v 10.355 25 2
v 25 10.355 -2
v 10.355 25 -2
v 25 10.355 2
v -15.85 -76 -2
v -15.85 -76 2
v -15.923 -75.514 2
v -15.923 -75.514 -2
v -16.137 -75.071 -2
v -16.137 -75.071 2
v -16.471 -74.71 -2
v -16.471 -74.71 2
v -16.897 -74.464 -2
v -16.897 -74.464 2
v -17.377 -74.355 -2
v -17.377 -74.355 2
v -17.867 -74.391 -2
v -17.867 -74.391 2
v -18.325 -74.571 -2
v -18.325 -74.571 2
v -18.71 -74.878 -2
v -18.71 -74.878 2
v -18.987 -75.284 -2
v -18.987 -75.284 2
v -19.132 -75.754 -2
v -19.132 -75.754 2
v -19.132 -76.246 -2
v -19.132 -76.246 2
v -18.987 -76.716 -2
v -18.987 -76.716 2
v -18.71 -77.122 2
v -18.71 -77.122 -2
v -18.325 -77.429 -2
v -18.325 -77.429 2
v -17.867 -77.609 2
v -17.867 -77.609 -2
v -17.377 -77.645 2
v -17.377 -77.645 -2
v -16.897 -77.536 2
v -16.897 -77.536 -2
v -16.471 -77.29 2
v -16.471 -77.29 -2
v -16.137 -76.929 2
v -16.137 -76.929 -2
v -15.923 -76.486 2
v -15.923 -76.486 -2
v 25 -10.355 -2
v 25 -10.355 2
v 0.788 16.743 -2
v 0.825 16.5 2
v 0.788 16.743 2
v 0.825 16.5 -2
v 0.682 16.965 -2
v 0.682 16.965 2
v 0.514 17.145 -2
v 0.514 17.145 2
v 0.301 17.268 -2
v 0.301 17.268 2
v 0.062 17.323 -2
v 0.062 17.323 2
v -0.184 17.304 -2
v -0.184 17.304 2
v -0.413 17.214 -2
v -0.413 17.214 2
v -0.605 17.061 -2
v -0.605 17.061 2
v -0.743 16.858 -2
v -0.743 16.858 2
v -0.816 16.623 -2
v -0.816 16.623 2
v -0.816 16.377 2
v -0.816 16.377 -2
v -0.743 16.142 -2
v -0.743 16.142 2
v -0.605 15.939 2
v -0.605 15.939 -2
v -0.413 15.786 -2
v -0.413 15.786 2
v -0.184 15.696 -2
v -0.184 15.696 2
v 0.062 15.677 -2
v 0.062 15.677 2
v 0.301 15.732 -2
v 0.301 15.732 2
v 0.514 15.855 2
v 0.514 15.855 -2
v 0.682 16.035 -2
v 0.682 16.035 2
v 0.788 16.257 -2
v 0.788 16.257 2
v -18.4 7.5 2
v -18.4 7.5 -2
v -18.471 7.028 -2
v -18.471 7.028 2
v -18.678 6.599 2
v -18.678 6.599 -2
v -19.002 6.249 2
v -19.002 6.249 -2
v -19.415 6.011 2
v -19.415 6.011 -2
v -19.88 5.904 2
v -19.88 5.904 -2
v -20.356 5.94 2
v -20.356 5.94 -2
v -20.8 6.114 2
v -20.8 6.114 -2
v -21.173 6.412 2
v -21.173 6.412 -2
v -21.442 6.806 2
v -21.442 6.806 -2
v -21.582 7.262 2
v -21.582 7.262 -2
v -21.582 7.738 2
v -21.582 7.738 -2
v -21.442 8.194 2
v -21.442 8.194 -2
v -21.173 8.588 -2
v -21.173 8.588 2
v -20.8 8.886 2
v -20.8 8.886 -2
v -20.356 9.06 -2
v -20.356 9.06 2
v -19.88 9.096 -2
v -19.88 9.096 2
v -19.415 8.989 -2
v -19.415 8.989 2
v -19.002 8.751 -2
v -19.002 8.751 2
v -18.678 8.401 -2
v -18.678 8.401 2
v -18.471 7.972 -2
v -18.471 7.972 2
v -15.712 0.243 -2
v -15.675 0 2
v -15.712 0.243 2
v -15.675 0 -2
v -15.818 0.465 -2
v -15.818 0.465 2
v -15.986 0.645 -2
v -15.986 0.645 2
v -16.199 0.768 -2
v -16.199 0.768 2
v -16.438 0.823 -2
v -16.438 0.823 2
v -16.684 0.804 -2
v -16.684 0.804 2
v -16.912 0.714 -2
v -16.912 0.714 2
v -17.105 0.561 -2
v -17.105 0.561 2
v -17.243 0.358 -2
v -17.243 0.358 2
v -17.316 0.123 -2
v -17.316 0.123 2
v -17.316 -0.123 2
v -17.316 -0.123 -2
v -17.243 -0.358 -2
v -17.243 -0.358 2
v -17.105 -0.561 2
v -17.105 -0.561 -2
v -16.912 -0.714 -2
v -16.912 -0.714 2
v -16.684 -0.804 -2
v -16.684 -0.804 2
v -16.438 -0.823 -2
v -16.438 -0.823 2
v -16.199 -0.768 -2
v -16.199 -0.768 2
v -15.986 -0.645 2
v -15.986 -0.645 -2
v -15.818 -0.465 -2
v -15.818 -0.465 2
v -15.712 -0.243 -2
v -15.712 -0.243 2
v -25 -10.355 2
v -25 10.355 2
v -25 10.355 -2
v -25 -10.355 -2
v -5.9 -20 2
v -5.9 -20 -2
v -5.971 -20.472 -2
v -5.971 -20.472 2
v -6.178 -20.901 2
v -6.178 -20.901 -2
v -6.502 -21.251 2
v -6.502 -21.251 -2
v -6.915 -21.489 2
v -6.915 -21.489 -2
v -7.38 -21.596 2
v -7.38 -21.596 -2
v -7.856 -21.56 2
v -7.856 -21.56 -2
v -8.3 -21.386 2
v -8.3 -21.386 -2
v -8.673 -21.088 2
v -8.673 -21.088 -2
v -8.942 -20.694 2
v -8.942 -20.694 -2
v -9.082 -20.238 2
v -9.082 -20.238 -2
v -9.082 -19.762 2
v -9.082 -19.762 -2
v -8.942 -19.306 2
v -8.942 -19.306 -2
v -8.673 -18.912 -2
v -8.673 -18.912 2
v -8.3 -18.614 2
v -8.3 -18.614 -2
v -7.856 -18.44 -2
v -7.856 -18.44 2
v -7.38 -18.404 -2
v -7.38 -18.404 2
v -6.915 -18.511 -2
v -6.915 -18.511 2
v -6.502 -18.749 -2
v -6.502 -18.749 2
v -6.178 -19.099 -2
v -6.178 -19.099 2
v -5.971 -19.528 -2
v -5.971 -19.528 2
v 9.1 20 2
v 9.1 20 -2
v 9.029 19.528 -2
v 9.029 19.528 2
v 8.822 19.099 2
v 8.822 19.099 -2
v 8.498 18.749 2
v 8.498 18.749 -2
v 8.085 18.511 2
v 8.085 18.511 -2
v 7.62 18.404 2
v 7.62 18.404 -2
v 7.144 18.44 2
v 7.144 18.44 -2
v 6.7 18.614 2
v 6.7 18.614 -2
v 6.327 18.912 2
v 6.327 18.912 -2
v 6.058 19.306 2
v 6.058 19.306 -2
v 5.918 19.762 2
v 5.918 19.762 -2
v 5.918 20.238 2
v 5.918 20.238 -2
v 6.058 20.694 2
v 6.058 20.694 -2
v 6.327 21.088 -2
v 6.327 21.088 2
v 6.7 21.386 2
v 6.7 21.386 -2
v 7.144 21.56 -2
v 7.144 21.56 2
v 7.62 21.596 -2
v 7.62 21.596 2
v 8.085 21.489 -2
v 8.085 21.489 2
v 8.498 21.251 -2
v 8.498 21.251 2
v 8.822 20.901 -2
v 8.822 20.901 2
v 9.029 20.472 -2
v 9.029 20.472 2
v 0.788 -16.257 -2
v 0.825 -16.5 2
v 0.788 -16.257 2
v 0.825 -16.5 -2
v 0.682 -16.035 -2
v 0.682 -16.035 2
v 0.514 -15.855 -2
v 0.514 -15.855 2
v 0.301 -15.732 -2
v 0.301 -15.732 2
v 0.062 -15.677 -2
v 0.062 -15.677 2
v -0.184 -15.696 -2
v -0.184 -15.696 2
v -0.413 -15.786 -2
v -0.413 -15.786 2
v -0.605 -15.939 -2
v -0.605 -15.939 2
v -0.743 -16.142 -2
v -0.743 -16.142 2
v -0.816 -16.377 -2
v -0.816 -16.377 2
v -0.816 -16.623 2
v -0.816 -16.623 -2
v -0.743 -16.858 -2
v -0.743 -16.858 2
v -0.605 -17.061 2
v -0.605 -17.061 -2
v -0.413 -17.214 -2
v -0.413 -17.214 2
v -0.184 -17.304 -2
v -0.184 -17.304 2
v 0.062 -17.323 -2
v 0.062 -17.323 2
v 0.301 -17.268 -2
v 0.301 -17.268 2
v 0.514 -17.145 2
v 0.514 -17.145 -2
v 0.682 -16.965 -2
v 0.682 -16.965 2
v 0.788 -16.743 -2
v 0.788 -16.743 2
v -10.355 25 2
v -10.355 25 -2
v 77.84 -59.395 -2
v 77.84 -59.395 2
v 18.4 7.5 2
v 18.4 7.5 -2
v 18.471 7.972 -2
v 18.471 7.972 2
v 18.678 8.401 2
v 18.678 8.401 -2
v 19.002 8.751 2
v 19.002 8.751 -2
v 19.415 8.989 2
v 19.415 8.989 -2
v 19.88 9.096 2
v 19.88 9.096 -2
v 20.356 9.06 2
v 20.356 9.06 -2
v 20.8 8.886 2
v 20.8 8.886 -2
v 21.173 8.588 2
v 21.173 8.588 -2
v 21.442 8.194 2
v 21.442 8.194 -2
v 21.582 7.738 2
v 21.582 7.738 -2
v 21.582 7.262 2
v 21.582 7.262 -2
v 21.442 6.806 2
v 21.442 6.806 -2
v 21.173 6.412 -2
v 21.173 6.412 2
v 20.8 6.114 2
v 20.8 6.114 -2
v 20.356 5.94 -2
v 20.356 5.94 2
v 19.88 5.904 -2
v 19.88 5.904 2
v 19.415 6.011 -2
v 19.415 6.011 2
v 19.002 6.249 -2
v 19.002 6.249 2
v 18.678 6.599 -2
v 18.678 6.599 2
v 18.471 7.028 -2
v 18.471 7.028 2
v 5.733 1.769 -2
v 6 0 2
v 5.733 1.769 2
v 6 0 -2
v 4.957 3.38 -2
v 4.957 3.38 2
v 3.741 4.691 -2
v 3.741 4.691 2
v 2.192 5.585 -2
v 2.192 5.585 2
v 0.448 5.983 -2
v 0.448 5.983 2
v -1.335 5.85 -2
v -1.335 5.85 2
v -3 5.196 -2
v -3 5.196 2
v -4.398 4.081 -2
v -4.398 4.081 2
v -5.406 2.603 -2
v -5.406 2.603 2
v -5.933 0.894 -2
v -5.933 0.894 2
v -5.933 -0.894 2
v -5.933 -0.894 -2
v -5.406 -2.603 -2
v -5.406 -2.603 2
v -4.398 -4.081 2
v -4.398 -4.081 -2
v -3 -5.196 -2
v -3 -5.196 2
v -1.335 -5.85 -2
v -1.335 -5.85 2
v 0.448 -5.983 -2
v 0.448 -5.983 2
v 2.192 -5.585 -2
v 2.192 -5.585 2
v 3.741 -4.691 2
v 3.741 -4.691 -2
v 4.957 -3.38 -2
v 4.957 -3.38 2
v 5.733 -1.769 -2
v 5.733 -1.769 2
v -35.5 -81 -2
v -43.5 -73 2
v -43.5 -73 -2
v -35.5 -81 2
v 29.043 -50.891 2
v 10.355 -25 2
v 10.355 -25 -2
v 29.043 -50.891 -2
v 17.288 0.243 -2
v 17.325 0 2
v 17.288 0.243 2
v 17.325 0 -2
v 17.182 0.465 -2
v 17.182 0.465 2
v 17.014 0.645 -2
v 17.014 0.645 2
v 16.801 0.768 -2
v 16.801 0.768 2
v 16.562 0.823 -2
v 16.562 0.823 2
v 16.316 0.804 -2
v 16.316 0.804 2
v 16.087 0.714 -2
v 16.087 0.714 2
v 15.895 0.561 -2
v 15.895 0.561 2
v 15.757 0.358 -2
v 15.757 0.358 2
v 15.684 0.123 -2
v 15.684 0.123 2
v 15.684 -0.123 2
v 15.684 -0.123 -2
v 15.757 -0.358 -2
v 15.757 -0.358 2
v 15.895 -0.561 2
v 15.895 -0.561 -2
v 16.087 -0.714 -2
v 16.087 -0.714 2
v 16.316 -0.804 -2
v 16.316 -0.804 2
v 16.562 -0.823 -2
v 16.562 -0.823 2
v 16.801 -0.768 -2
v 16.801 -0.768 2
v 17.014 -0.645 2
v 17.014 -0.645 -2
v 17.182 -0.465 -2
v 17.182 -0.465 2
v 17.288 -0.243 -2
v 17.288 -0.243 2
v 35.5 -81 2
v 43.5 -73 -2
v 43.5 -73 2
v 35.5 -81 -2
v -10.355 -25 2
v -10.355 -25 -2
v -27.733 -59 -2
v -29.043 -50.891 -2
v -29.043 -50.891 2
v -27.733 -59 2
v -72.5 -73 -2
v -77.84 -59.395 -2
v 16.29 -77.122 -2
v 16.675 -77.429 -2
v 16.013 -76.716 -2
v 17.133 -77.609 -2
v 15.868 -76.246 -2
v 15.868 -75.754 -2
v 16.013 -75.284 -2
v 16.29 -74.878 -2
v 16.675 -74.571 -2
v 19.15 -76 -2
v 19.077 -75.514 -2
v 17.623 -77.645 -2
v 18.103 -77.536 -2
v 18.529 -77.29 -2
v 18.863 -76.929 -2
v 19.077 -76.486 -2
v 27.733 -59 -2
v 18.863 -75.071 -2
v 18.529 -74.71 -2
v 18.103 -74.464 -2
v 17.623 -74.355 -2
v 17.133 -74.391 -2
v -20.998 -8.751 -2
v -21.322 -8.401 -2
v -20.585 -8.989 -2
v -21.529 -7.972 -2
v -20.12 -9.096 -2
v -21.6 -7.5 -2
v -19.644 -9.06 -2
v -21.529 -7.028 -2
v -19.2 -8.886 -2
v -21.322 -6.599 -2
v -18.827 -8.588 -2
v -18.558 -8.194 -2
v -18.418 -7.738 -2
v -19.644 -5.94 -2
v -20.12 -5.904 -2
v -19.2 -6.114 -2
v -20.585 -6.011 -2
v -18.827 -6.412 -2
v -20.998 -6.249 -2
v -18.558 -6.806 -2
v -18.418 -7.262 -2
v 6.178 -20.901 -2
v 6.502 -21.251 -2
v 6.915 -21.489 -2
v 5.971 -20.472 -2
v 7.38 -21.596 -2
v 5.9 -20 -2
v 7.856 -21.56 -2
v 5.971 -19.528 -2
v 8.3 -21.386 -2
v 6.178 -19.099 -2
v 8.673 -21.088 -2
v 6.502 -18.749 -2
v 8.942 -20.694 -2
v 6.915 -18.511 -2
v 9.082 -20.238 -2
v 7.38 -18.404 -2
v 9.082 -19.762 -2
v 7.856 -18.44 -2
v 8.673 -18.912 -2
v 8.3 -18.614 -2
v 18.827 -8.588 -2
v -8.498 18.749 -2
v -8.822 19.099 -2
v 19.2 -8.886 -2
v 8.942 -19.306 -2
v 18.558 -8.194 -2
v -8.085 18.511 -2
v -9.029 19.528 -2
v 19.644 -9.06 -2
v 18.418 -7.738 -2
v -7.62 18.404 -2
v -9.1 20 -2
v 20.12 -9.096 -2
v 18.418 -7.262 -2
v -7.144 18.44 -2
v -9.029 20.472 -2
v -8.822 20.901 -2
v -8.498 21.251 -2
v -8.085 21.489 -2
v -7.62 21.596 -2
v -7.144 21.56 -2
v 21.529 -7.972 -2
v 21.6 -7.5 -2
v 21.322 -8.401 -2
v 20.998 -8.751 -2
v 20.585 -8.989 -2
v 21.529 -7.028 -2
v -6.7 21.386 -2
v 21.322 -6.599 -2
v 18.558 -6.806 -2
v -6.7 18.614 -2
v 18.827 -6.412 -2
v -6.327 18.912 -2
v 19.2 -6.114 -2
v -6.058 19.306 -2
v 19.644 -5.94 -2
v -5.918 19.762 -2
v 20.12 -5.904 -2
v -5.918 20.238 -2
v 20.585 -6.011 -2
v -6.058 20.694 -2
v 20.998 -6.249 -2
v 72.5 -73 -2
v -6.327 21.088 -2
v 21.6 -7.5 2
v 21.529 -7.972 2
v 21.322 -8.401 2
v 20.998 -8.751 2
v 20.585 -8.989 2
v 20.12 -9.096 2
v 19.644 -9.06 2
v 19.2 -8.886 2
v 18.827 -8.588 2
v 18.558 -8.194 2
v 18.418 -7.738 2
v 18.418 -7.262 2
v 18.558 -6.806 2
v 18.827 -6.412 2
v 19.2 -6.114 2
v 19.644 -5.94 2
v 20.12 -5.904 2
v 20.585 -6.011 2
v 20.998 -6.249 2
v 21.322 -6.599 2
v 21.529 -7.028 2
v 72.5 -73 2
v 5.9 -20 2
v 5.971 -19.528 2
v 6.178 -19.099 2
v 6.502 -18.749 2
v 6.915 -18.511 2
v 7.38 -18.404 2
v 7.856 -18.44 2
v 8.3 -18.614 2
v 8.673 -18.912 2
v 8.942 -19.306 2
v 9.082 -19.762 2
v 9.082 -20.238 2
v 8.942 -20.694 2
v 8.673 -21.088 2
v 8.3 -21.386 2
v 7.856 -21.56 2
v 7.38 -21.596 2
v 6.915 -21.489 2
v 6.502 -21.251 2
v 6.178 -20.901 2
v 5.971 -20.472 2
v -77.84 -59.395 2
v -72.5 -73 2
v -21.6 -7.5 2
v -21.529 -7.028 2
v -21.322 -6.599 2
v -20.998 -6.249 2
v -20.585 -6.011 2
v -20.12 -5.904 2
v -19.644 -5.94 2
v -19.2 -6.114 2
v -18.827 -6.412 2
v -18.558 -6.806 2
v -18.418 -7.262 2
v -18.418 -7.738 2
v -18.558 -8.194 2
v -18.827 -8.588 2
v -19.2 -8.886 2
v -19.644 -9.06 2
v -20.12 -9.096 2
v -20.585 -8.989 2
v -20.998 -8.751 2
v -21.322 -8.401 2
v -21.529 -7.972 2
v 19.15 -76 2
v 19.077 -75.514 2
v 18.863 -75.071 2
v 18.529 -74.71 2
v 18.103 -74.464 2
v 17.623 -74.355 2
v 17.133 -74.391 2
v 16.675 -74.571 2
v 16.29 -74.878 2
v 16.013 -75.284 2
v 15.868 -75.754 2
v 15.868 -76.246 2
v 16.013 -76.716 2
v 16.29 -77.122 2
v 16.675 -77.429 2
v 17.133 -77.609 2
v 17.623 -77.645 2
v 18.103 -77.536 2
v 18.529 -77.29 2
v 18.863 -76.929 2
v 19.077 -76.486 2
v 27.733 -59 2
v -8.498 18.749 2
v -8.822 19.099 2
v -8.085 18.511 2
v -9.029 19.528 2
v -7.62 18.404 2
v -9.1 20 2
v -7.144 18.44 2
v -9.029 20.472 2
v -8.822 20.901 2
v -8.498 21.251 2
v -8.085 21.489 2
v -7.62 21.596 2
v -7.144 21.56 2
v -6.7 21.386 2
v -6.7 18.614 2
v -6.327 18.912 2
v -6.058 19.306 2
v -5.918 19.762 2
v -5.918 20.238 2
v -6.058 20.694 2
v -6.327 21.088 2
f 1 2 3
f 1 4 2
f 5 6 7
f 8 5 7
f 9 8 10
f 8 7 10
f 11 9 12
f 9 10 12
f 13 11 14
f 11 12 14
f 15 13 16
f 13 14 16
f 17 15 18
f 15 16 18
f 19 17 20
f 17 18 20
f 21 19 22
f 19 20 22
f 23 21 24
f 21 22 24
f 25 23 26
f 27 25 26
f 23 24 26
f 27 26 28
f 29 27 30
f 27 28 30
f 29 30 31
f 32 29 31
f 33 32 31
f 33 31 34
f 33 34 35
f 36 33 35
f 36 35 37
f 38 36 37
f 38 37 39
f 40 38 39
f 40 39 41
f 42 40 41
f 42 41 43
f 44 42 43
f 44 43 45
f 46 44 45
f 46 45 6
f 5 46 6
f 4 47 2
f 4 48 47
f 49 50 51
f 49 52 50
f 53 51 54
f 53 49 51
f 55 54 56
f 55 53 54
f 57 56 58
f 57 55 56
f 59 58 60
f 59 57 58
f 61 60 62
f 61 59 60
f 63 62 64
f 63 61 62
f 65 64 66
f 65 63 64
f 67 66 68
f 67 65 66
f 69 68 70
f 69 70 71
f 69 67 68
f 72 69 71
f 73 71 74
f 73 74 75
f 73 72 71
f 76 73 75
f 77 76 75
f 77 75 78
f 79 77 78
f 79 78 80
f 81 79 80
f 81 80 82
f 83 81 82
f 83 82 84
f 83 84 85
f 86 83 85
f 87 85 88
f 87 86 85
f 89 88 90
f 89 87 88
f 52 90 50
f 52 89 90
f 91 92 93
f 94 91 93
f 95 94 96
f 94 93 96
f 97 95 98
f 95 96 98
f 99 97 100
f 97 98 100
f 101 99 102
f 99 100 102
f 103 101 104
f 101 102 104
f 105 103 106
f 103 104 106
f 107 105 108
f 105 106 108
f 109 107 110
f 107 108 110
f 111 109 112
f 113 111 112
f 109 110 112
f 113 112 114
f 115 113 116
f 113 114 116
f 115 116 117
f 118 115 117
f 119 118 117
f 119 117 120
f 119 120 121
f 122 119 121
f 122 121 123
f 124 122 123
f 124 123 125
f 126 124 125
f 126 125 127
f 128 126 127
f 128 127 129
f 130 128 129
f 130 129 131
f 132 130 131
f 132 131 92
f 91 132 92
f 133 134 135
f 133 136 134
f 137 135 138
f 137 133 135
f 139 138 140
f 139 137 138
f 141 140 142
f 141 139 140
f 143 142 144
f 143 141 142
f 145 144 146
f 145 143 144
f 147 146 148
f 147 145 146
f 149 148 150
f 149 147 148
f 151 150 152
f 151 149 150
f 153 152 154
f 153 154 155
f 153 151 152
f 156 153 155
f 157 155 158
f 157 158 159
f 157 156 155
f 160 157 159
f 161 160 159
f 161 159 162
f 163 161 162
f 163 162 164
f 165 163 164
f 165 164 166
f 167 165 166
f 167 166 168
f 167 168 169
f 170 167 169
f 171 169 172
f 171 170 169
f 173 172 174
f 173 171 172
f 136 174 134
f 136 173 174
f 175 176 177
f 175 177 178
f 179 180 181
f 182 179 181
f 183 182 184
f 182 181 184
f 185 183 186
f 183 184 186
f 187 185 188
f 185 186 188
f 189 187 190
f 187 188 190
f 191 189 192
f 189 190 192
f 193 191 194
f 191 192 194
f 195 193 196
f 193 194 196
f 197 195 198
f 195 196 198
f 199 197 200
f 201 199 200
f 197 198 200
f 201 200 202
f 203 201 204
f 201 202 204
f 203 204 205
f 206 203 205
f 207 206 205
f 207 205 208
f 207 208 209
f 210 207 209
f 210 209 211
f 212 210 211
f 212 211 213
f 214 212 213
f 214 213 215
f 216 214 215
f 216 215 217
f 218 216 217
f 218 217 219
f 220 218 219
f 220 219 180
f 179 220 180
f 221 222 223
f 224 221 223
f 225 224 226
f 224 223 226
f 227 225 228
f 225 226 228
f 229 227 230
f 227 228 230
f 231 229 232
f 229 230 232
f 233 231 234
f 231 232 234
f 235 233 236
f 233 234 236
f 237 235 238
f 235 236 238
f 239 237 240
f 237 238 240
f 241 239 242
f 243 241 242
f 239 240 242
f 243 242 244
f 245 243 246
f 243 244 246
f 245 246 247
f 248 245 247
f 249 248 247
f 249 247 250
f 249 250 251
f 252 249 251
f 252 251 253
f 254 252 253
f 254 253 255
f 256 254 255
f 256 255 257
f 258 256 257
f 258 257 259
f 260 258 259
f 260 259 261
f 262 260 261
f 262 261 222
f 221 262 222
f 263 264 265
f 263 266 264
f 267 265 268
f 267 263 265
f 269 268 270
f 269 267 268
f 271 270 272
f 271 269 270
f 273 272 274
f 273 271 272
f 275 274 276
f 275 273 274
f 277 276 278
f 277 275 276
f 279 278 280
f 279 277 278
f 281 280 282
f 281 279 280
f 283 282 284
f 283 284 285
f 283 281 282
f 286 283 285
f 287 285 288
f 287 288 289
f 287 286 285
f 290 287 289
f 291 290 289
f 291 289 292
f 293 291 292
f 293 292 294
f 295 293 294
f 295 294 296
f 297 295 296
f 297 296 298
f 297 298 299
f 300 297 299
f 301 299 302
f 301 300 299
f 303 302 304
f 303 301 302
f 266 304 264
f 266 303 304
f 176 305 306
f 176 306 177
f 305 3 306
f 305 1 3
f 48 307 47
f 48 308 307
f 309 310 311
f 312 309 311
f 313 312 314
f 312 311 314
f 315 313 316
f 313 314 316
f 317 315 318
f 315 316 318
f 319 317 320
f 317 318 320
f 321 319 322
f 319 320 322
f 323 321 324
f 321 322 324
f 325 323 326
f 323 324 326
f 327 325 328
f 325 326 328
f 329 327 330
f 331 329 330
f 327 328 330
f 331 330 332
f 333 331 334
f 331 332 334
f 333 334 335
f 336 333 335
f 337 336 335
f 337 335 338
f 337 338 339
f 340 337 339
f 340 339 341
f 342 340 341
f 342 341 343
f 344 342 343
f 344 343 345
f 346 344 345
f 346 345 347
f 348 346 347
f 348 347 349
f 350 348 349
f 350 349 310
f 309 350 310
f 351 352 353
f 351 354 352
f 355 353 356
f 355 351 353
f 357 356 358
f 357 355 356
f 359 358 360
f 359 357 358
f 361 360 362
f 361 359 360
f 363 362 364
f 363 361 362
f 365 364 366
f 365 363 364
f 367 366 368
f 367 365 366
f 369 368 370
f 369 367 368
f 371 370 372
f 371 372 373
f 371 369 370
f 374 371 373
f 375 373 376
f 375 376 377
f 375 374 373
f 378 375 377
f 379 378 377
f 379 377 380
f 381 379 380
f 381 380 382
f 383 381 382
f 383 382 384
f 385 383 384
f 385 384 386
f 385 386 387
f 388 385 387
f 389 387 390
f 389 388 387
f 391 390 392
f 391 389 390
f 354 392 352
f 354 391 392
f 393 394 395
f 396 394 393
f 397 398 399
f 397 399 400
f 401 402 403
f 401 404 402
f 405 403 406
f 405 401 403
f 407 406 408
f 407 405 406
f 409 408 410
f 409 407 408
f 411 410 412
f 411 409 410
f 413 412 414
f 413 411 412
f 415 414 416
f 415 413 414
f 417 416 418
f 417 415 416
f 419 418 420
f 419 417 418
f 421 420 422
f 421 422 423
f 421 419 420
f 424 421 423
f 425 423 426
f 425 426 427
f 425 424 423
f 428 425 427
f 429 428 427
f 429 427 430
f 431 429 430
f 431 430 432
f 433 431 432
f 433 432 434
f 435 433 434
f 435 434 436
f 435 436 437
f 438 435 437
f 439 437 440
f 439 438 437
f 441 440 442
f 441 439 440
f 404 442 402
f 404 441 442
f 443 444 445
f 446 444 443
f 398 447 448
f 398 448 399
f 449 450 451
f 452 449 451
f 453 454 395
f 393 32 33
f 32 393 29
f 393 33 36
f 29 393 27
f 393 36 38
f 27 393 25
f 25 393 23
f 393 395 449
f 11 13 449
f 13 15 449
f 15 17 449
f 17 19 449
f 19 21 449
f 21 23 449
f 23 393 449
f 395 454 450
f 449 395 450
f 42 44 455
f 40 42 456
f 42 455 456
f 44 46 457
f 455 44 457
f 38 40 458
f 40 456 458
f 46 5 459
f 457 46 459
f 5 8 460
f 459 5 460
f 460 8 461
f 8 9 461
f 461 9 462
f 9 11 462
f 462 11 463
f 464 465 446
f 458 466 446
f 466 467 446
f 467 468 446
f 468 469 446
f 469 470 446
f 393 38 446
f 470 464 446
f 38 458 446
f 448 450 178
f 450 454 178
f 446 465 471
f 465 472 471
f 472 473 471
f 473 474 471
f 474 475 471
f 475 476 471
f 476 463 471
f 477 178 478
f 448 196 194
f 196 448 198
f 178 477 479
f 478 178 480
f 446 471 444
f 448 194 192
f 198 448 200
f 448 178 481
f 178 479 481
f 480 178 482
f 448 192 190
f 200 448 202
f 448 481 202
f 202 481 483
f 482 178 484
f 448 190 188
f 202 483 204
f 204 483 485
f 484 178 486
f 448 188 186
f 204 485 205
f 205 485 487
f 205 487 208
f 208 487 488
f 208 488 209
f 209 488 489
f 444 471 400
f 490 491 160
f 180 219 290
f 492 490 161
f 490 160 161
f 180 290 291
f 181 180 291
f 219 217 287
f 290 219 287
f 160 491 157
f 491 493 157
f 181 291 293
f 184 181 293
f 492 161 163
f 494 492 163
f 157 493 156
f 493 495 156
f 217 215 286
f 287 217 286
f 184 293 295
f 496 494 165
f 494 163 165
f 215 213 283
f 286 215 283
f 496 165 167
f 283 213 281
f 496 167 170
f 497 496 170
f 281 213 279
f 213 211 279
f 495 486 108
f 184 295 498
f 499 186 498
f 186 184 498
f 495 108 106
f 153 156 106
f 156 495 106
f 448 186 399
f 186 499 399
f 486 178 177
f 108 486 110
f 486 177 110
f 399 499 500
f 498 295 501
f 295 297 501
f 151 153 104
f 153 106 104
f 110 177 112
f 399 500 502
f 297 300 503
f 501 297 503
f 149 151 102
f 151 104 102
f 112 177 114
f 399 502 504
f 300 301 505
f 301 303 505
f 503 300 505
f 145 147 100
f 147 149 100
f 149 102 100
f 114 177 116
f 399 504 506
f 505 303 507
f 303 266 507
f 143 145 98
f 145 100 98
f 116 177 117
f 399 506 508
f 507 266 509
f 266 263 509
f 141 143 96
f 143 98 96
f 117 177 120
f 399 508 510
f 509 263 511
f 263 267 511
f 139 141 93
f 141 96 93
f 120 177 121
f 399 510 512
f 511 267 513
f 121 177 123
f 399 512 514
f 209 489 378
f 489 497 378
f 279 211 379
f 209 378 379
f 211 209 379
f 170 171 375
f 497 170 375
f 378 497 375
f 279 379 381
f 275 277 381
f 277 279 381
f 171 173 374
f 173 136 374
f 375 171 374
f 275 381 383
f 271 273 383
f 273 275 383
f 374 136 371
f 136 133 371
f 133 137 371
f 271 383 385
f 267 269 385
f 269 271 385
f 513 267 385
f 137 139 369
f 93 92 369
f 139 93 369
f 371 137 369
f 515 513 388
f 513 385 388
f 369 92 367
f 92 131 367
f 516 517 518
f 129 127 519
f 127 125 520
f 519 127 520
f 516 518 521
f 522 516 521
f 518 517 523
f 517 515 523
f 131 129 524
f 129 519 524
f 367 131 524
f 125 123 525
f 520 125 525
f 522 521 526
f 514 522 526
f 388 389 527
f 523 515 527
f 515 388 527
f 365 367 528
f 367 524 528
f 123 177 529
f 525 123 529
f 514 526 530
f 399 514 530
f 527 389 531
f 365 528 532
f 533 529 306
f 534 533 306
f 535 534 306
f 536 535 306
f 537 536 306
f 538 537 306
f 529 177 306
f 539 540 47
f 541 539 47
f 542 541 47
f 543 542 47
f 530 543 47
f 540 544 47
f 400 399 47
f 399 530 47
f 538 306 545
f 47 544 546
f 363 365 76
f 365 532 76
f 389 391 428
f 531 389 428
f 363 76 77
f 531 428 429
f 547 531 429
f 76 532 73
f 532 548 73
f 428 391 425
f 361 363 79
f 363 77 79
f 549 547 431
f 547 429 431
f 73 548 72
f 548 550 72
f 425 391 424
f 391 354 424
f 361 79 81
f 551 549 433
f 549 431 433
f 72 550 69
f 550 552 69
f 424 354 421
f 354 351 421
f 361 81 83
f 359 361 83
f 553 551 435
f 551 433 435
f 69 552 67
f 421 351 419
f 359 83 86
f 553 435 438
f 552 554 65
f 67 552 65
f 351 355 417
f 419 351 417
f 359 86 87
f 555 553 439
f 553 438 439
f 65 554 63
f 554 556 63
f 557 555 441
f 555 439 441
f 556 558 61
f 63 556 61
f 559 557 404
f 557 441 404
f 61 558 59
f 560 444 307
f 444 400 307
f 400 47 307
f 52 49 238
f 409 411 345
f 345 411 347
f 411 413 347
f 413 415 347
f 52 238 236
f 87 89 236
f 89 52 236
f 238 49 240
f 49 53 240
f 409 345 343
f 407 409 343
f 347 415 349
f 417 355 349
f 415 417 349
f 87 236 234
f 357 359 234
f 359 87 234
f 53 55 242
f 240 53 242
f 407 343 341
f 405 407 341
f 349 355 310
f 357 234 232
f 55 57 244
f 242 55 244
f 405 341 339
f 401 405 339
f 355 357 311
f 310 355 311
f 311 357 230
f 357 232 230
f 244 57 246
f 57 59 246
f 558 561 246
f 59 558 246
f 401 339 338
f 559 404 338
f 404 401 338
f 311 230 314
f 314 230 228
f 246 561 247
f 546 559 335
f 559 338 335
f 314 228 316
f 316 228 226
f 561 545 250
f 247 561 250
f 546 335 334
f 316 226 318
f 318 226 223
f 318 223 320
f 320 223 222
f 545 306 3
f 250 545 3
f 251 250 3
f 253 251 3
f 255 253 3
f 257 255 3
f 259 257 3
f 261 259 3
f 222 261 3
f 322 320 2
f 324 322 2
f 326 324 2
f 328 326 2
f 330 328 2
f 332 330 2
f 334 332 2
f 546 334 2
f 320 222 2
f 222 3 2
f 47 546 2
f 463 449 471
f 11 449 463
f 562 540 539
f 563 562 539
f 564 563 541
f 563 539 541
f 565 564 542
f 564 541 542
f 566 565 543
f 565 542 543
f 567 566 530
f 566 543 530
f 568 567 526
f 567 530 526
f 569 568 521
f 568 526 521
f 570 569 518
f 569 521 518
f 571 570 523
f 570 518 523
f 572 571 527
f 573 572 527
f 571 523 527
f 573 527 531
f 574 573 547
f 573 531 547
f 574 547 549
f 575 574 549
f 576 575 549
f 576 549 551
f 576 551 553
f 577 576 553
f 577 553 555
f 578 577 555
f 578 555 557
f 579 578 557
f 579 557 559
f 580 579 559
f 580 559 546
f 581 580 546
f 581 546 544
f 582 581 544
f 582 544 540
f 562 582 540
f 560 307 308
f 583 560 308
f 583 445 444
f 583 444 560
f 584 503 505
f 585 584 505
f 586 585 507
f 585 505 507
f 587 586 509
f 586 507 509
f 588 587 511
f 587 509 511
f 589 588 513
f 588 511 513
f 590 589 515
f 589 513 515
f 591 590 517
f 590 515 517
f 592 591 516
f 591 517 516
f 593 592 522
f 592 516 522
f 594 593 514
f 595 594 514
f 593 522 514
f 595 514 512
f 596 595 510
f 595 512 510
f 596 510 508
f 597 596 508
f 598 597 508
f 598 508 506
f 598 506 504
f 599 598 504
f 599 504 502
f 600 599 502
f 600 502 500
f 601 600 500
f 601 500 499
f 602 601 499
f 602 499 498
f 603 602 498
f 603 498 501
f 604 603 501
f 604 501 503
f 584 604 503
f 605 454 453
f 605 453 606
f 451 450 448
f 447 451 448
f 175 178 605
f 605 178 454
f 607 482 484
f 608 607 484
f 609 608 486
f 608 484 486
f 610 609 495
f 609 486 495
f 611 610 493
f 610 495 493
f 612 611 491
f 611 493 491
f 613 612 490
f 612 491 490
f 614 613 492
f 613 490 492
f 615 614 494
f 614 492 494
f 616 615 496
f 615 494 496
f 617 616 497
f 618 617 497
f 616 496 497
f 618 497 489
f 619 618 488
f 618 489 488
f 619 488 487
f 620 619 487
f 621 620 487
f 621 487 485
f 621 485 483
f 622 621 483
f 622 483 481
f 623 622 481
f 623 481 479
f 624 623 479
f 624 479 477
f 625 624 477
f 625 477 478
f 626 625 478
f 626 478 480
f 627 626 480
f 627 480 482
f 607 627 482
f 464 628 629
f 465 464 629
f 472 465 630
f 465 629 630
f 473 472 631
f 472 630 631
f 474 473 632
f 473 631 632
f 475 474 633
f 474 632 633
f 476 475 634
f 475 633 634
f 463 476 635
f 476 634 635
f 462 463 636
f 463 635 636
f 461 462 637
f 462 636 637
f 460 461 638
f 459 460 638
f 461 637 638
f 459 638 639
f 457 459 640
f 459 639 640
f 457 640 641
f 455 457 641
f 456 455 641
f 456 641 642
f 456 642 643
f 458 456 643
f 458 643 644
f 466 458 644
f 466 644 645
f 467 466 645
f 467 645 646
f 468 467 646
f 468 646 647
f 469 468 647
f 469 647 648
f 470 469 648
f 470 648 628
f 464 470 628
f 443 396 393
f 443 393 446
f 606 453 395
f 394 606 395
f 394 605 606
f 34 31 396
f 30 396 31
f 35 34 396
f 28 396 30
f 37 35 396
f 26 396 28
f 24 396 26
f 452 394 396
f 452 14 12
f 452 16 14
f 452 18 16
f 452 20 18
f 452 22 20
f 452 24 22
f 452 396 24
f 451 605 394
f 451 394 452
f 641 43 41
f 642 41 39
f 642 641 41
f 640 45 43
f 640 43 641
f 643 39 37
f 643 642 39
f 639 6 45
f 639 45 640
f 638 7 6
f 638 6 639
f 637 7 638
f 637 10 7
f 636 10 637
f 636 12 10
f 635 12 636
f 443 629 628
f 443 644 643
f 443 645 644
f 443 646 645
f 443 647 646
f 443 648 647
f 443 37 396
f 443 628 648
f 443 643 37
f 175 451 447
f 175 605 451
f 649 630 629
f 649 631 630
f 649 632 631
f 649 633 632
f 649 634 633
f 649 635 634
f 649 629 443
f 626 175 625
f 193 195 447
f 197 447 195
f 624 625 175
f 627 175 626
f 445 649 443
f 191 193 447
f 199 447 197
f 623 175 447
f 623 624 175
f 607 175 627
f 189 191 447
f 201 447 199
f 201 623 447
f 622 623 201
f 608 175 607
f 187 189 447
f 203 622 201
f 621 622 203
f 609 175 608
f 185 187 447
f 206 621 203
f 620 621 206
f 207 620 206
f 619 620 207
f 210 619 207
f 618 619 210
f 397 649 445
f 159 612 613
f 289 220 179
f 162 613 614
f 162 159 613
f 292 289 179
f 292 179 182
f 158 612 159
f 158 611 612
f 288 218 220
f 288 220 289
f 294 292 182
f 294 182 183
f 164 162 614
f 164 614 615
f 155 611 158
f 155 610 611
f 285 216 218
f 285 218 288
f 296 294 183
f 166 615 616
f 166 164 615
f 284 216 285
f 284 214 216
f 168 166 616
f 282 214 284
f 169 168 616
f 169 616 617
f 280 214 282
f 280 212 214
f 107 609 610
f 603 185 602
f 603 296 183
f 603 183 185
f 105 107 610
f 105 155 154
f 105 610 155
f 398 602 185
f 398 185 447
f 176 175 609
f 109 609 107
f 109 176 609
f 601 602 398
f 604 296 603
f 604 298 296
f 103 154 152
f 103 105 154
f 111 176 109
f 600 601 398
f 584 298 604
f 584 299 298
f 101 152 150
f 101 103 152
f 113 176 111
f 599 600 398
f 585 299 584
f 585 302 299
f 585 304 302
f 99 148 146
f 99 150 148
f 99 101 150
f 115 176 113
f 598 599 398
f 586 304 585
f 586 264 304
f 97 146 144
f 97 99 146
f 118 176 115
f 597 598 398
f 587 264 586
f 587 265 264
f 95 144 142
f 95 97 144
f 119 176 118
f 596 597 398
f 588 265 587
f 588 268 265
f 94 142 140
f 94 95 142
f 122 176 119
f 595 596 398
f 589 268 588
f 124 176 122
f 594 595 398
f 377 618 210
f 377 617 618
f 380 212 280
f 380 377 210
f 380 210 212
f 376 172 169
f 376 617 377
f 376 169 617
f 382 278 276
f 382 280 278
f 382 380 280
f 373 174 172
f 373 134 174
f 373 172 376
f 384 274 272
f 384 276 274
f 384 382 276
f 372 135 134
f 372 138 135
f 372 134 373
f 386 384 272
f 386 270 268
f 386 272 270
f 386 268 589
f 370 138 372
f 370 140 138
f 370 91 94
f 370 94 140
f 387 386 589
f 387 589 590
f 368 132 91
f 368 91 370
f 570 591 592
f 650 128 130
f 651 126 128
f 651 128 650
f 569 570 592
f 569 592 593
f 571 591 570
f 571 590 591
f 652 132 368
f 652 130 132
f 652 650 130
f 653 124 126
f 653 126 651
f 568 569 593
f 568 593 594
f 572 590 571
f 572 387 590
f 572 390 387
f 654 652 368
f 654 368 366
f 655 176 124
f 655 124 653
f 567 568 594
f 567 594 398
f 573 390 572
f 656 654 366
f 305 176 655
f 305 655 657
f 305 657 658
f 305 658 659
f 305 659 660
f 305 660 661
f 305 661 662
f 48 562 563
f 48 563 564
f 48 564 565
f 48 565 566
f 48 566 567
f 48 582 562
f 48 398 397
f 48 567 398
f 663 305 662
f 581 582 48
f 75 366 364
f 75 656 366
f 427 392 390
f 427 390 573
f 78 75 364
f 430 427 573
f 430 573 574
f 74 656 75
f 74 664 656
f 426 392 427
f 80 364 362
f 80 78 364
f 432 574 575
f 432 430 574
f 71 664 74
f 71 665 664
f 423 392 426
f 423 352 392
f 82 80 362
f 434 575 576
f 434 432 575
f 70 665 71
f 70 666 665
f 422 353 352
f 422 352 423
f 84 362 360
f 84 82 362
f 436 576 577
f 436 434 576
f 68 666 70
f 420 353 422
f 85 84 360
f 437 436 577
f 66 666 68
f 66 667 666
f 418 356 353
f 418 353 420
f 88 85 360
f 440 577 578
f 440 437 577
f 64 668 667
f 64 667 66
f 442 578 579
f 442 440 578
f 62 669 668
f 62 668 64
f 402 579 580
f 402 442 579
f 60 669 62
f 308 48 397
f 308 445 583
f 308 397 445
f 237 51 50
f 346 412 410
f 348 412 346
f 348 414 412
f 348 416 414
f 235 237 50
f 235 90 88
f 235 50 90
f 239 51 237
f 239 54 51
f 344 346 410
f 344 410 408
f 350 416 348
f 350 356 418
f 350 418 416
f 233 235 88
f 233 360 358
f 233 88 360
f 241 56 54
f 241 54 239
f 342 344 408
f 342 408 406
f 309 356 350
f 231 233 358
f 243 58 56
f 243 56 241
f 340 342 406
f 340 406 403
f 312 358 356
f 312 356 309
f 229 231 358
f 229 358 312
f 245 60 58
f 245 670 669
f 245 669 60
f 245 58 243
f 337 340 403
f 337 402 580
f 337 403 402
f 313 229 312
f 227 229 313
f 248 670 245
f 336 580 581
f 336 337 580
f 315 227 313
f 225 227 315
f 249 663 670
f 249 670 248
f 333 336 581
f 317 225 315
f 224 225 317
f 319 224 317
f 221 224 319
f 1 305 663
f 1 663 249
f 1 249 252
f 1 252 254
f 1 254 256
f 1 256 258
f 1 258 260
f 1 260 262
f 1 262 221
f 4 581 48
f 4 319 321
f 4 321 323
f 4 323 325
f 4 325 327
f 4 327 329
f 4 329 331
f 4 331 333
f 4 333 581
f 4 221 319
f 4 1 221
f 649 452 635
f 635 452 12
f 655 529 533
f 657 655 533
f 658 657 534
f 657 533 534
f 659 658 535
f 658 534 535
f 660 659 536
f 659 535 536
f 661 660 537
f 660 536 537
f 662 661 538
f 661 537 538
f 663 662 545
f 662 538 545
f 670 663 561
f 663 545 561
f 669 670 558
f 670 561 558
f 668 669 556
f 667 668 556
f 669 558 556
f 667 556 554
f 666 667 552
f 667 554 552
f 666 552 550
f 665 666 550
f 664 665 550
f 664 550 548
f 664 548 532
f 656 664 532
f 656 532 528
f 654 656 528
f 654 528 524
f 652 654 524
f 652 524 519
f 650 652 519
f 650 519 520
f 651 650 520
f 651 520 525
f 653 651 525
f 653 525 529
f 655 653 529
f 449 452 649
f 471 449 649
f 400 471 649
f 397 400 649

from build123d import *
from OCP.BRepFilletAPI import BRepFilletAPI_MakeChamfer

# Parameters (mm, degrees)
SKETCH_2_R          = 0.825
SKETCH_2_R_2        = 6
EXTRUDE_1_DEPTH     = 2
SKETCH_4_R          = 1.6
CUT_EXTRUDE_1_DEPTH = 15
EXTRUDE_2_DEPTH     = 2
EXTRUDE_3_DEPTH     = 2
CHAMFER_2_SIZE      = 20
SKETCH_8_W          = 95
SKETCH_8_H          = 22
EXTRUDE_4_DEPTH     = 2
CHAMFER_3_SIZE      = 12
CHAMFER_4_SIZE      = 10
CHAMFER_4_SIZE2     = 7.162801166
SKETCH_10_R         = 1.65
CUT_EXTRUDE_2_DEPTH = 14


with BuildPart() as part:
    # 草图2 → 凸台-拉伸1 (new, symmetric)
    with BuildSketch(Plane.XY):
        Polygon((10.355339059, 25), (-10.355339059, 25), (-25, 10.355339059), (-25, -10.355339059), (-10.355339059, -25), (10.355339059, -25), (25, -10.355339059), (25, 10.355339059), align=None)
        with Locations((-16.5, 0)):
            Circle(SKETCH_2_R, mode=Mode.SUBTRACT)
        with Locations((0, 16.5)):
            Circle(SKETCH_2_R, mode=Mode.SUBTRACT)
        with Locations((16.5, 0)):
            Circle(SKETCH_2_R, mode=Mode.SUBTRACT)
        with Locations((0, -16.5)):
            Circle(SKETCH_2_R, mode=Mode.SUBTRACT)
        Circle(SKETCH_2_R_2, mode=Mode.SUBTRACT)
    extrude(amount=EXTRUDE_1_DEPTH, both=True)

    # 草图4 → 切除-拉伸1 (cut)
    with BuildSketch(Plane(origin=(0, 0, -2), x_dir=(-1, 0, 0), z_dir=(0, 0, -1))):
        with Locations((-7.5, -20)):
            Circle(SKETCH_4_R)
        with Locations(Location((7.5, -20, 0), (0, 0, 180))):
            Circle(SKETCH_4_R)
        with Locations((-20, 7.5)):
            Circle(SKETCH_4_R)
        with Locations(Location((-20, -7.5, 0), (0, 0, 180))):
            Circle(SKETCH_4_R)
        with Locations((7.5, 20)):
            Circle(SKETCH_4_R)
        with Locations(Location((-7.5, 20, 0), (0, 0, 180))):
            Circle(SKETCH_4_R)
        with Locations((20, -7.5)):
            Circle(SKETCH_4_R)
        with Locations(Location((20, 7.5, 0), (0, 0, 180))):
            Circle(SKETCH_4_R)
    extrude(amount=-CUT_EXTRUDE_1_DEPTH, mode=Mode.SUBTRACT)

    # 草图5 → 凸台-拉伸2 (add, symmetric)
    with BuildSketch(Plane.XY):
        Polygon((-25, -10.355339059), (-92.5, -73), (-70, -73), (-16.17766953, -19.17766953), align=None)
        Polygon((70, -73), (92.5, -73), (25, -10.355339059), (16.17766953, -19.17766953), align=None)
    extrude(amount=EXTRUDE_2_DEPTH, both=True)

    # 草图6 → 凸台-拉伸3 (add, symmetric)
    with BuildSketch(Plane.XY):
        Polygon((-70, -73), (-45, -73), (-10.355339059, -25), (-16.17766953, -19.17766953), align=None)
        Polygon((70, -73), (16.17766953, -19.17766953), (10.355339059, -25), (45, -73), align=None)
    extrude(amount=EXTRUDE_3_DEPTH, both=True)

    # 倒角2
    chamfer_2_edges = [part.edges().sort_by_distance(p)[0] for p in [
        (-92.5, -73, 0),
        (92.5, -73, 0),
    ]]
    chamfer(chamfer_2_edges, length=CHAMFER_2_SIZE)

    # 草图8 → 凸台-拉伸4 (add, symmetric)
    with BuildSketch(Plane.XY):
        with Locations((0, -70)):
            Rectangle(SKETCH_8_W, SKETCH_8_H)
    extrude(amount=EXTRUDE_4_DEPTH, both=True)

    # 倒角3
    # the kernel refuses this chamfer: 12 mm, written as the material it takes off along each edge
    with BuildSketch(Plane(origin=(47.5, -81, -32.860195856), x_dir=(0.02749587661058619, 0.9996219169112968, 0), z_dir=(0, 0, 1))) as chamfer_3_piece_1_section:
        Polygon((CHAMFER_3_SIZE * 0.999621916911, CHAMFER_3_SIZE * 0.0274958766106), (-CHAMFER_3_SIZE * 0.0274958766106, CHAMFER_3_SIZE * 0.999621916911), (0, 0), align=None)
    chamfer_3_piece_1 = extrude(amount=65.720391711, mode=Mode.PRIVATE)
    chamfer_3_piece_1 = split(chamfer_3_piece_1, bisect_by=Plane(origin=(43.13163598, -73, 0), z_dir=(0, -1, 0)), keep=Keep.TOP, mode=Mode.PRIVATE)
    add(chamfer_3_piece_1, mode=Mode.SUBTRACT)
    with BuildSketch(Plane(origin=(-47.5, -81, 32.860195856), x_dir=(-0.02749587661058619, 0.9996219169112968, 0), z_dir=(0, 0, -1))) as chamfer_3_piece_2_section:
        Polygon((CHAMFER_3_SIZE * 0.999621916911, CHAMFER_3_SIZE * 0.0274958766106), (-CHAMFER_3_SIZE * 0.0274958766106, CHAMFER_3_SIZE * 0.999621916911), (0, 0), align=None)
    chamfer_3_piece_2 = extrude(amount=65.720391711, mode=Mode.PRIVATE)
    chamfer_3_piece_2 = split(chamfer_3_piece_2, bisect_by=Plane(origin=(-43.13163598, -73, 0), z_dir=(0, -1, 0)), keep=Keep.TOP, mode=Mode.PRIVATE)
    add(chamfer_3_piece_2, mode=Mode.SUBTRACT)

    # 倒角4: one chamfer whose edges measure the first distance from different faces: ONE call of the kernel's chamfer builder (chamfer() names one face for all edges)
    chamfer_4_edges_1 = [part.edges().sort_by_distance(p)[0] for p in [
        (34.895307226, -59, 0),
    ]]
    chamfer_4_side_1 = [part.faces().sort_by_distance(p)[0] for p in [
        (22.625323142, -42, 0),
    ]]
    chamfer_4_edges_2 = [part.edges().sort_by_distance(p)[0] for p in [
        (-34.895307226, -59, 0),
    ]]
    chamfer_4_side_2 = [part.faces().sort_by_distance(p)[0] for p in [
        (-22.625323142, -42, 0),
    ]]
    chamfer_4 = BRepFilletAPI_MakeChamfer(part.part.solid().wrapped)
    for e in chamfer_4_edges_1:
        chamfer_4.Add(CHAMFER_4_SIZE, CHAMFER_4_SIZE2, e.wrapped, chamfer_4_side_1[0].wrapped)  # the first distance lies on this face
    for e in chamfer_4_edges_2:
        chamfer_4.Add(CHAMFER_4_SIZE, CHAMFER_4_SIZE2, e.wrapped, chamfer_4_side_2[0].wrapped)  # the first distance lies on this face
    add(Compound.cast(chamfer_4.Shape()), mode=Mode.REPLACE)

    # 草图10 → 切除-拉伸2 (cut)
    with BuildSketch(Plane.XY.offset(2)):
        with Locations((-17.5, -76)):
            Circle(SKETCH_10_R)
        with Locations((17.5, -76)):
            Circle(SKETCH_10_R)
    extrude(amount=-CUT_EXTRUDE_2_DEPTH, mode=Mode.SUBTRACT)


solid = part.part
